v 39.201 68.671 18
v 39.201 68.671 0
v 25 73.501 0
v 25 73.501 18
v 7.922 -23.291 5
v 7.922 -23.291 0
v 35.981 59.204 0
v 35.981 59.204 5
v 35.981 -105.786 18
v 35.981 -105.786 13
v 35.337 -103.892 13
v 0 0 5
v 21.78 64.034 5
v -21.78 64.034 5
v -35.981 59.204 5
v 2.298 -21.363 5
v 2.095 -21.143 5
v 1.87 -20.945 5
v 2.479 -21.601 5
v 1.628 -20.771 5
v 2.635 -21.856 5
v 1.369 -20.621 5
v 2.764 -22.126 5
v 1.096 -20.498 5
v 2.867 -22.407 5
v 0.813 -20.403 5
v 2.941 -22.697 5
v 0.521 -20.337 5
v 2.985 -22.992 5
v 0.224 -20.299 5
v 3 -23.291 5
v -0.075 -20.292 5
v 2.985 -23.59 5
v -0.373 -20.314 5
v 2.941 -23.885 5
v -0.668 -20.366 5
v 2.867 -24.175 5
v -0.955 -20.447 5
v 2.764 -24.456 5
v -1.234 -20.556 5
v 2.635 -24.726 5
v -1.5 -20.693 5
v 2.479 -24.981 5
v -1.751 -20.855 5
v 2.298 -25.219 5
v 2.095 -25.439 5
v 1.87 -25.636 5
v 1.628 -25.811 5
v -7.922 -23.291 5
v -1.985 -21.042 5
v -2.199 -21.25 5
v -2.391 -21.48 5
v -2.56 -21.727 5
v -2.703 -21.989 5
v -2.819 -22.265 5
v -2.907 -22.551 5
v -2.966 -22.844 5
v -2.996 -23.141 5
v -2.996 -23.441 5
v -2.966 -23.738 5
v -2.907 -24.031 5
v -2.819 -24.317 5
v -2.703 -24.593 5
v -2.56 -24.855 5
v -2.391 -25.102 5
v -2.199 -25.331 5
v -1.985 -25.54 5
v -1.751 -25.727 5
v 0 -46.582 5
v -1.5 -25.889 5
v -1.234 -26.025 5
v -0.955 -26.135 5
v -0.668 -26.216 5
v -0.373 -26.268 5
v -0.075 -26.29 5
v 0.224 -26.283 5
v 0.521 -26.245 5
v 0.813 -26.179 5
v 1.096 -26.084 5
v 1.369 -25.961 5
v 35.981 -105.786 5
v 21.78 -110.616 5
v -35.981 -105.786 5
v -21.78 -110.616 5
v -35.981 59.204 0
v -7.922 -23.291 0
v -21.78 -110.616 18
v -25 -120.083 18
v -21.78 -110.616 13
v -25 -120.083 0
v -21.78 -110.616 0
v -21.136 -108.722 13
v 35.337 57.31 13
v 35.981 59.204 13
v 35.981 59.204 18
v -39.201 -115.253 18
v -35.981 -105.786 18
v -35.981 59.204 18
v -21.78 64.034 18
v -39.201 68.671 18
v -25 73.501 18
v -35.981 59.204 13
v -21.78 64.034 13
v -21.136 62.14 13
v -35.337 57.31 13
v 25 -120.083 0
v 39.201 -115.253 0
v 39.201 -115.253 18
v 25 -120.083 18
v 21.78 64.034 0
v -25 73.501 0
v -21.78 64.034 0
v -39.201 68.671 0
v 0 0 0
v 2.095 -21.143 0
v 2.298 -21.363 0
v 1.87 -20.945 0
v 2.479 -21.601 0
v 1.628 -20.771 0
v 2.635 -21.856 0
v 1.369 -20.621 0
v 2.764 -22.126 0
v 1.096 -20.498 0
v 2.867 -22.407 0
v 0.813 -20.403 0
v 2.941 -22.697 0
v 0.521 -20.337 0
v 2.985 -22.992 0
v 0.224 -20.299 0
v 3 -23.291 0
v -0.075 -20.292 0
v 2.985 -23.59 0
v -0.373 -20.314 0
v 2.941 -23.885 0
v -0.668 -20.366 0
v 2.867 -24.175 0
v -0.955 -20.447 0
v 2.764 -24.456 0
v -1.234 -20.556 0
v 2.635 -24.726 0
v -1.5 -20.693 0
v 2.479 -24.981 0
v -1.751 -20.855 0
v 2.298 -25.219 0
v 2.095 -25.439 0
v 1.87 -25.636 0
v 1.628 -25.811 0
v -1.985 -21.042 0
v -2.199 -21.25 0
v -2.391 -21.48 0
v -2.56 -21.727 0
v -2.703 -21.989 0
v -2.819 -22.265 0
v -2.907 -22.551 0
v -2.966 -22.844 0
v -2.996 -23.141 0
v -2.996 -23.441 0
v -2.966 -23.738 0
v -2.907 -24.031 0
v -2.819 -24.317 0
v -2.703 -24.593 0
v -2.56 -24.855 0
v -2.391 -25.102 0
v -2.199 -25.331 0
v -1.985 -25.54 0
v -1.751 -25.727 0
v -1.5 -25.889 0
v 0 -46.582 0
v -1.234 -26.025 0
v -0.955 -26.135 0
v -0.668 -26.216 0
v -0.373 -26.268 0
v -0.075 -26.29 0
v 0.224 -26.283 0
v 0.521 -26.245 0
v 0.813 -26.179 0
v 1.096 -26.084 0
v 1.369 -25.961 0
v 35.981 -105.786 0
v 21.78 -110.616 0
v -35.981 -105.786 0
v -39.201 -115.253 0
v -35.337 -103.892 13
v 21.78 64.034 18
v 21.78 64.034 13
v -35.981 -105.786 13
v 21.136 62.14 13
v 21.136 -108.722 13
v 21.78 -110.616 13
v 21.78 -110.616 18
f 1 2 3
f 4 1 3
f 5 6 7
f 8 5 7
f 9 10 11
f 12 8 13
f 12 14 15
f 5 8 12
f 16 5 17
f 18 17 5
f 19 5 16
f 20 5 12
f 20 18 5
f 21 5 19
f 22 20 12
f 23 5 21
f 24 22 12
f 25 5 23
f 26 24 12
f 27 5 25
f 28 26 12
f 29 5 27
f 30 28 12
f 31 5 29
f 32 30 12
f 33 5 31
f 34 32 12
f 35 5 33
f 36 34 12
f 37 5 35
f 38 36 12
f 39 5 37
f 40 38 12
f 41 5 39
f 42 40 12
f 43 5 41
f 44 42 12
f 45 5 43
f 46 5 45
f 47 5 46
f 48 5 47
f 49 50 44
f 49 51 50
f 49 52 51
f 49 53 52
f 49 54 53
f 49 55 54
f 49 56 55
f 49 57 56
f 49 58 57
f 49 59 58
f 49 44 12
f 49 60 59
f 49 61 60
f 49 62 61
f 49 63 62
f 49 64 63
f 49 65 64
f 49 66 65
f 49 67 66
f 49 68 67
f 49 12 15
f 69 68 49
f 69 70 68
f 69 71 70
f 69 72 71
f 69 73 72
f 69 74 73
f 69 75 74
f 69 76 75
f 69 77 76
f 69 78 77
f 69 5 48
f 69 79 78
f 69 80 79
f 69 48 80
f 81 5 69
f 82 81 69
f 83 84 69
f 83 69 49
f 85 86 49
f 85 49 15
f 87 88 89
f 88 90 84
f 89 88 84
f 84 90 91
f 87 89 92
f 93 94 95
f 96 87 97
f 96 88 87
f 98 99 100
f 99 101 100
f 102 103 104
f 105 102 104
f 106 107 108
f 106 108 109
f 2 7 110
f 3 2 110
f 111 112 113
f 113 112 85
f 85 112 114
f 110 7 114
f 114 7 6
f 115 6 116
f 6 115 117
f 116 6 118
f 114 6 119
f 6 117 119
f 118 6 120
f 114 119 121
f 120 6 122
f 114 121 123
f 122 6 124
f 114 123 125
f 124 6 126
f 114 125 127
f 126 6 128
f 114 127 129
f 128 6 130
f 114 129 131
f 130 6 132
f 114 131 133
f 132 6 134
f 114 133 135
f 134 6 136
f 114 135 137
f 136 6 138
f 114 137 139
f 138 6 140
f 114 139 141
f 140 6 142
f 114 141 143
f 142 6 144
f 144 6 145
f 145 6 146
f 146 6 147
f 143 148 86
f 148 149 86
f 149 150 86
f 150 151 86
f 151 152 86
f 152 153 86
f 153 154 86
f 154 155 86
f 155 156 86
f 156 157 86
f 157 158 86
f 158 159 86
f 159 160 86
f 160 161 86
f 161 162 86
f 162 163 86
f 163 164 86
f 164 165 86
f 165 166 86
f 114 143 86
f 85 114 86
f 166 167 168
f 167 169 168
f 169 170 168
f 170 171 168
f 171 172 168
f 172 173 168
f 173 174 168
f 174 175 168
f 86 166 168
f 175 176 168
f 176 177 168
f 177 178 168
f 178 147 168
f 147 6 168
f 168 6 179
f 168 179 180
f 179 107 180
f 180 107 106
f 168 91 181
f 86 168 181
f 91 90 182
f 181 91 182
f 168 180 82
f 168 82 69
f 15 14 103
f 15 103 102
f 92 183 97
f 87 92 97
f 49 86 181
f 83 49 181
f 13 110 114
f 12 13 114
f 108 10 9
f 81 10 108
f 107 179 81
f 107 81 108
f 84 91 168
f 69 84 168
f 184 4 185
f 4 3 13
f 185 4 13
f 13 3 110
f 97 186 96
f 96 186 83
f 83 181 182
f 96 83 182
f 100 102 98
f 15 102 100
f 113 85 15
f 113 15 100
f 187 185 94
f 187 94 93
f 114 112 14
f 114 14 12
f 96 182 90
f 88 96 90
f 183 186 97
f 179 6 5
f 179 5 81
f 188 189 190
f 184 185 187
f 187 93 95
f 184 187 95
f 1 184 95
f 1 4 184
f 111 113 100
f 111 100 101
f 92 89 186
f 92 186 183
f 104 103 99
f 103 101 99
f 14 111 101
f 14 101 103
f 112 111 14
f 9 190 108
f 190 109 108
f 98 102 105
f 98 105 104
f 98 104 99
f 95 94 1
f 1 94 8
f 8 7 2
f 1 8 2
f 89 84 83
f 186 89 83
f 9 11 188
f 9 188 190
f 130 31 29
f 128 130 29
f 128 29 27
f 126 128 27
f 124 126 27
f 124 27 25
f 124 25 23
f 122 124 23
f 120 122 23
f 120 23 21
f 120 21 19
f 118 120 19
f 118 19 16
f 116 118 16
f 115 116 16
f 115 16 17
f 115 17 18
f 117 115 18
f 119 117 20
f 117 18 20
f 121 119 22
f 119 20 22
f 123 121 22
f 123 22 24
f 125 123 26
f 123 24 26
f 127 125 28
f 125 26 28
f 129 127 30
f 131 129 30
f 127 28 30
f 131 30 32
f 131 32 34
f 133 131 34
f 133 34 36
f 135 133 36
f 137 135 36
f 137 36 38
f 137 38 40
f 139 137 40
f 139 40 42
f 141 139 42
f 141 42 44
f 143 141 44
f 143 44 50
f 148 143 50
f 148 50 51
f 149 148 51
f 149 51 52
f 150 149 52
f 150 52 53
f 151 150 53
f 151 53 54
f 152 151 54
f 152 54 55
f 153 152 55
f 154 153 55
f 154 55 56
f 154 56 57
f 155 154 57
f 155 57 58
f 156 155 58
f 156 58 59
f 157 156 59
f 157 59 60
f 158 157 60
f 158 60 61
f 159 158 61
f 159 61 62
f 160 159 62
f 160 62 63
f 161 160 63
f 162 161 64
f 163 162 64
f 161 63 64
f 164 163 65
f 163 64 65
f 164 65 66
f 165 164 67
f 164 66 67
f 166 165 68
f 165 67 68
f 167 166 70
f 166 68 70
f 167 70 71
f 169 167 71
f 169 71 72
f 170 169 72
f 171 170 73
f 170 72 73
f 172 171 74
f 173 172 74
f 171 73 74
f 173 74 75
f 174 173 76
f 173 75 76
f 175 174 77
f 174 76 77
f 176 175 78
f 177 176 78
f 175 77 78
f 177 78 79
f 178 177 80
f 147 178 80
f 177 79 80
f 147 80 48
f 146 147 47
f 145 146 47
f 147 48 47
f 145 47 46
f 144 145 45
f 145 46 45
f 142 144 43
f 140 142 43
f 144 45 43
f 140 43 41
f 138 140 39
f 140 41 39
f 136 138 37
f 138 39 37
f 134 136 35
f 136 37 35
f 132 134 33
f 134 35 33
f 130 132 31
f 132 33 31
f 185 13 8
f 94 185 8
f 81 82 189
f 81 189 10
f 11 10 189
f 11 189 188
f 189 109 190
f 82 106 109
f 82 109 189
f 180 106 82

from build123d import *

# Parameters (mm, degrees)
F7_DEPTH = 5
F0_DEPTH = 18
F2_DEPTH = 15
F5_R     = 3
F8_DEPTH = 25


# Not quite as in the source:
# - a feature names something its author has since deleted; it is built from what else it names


with BuildPart() as f7:
    # F6 (on Top) → F7 (new body)
    with BuildSketch(Plane.XY):
        Polygon((0, -23.2909718978), (7.9219618343, -23.2909718978), (35.9808959381, 59.2037256741), (21.7798681683, 64.0339234217), (0, 0), align=None)
    extrude(amount=F7_DEPTH)

    # F6 (on Top) → F0 (join)
    with BuildSketch(Plane.XY):
        Polygon((21.7798681683, 64.0339234217), (35.9808959381, 59.2037256741), (39.2010277698, 68.6710775207), (25, 73.5012752683), align=None)
    extrude(amount=F0_DEPTH)

    # F1 (on face) → F2 (join, through all)
    with BuildSketch(Plane(origin=(0, 0, 0), x_dir=(-0.3220131832, -0.9467351847, 0), z_dir=(-0.9467351847, 0.3220131832, 0))):
        Polygon((-65.6365729928, 13), (-67.6365729928, 18), (-67.6365729928, 13), align=None)
    extrude(amount=-F2_DEPTH)

    # F3: F7 across face


with BuildPart() as f7_1:
    add(f7.part)
    add(f7.part.mirror(Plane(origin=(0, -11.6454859489, 2.5), x_dir=(0, -1, 0), z_dir=(-1, 0, 0))))

    # F4: F7 across face


with BuildPart() as f7_2:
    add(f7_1.part)
    add(f7_1.part.mirror(Plane(origin=(0, -23.2909718978, 2.5), x_dir=(1, 0, 0), z_dir=(0, -1, 0))))

    # F5 (on face) → F8 (cut)
    with BuildSketch(Plane.XY.offset(5)):
        with Locations((0, -23.2909718978)):
            Circle(F5_R)
    extrude(amount=-F8_DEPTH, mode=Mode.SUBTRACT)


solid = f7_2.part
